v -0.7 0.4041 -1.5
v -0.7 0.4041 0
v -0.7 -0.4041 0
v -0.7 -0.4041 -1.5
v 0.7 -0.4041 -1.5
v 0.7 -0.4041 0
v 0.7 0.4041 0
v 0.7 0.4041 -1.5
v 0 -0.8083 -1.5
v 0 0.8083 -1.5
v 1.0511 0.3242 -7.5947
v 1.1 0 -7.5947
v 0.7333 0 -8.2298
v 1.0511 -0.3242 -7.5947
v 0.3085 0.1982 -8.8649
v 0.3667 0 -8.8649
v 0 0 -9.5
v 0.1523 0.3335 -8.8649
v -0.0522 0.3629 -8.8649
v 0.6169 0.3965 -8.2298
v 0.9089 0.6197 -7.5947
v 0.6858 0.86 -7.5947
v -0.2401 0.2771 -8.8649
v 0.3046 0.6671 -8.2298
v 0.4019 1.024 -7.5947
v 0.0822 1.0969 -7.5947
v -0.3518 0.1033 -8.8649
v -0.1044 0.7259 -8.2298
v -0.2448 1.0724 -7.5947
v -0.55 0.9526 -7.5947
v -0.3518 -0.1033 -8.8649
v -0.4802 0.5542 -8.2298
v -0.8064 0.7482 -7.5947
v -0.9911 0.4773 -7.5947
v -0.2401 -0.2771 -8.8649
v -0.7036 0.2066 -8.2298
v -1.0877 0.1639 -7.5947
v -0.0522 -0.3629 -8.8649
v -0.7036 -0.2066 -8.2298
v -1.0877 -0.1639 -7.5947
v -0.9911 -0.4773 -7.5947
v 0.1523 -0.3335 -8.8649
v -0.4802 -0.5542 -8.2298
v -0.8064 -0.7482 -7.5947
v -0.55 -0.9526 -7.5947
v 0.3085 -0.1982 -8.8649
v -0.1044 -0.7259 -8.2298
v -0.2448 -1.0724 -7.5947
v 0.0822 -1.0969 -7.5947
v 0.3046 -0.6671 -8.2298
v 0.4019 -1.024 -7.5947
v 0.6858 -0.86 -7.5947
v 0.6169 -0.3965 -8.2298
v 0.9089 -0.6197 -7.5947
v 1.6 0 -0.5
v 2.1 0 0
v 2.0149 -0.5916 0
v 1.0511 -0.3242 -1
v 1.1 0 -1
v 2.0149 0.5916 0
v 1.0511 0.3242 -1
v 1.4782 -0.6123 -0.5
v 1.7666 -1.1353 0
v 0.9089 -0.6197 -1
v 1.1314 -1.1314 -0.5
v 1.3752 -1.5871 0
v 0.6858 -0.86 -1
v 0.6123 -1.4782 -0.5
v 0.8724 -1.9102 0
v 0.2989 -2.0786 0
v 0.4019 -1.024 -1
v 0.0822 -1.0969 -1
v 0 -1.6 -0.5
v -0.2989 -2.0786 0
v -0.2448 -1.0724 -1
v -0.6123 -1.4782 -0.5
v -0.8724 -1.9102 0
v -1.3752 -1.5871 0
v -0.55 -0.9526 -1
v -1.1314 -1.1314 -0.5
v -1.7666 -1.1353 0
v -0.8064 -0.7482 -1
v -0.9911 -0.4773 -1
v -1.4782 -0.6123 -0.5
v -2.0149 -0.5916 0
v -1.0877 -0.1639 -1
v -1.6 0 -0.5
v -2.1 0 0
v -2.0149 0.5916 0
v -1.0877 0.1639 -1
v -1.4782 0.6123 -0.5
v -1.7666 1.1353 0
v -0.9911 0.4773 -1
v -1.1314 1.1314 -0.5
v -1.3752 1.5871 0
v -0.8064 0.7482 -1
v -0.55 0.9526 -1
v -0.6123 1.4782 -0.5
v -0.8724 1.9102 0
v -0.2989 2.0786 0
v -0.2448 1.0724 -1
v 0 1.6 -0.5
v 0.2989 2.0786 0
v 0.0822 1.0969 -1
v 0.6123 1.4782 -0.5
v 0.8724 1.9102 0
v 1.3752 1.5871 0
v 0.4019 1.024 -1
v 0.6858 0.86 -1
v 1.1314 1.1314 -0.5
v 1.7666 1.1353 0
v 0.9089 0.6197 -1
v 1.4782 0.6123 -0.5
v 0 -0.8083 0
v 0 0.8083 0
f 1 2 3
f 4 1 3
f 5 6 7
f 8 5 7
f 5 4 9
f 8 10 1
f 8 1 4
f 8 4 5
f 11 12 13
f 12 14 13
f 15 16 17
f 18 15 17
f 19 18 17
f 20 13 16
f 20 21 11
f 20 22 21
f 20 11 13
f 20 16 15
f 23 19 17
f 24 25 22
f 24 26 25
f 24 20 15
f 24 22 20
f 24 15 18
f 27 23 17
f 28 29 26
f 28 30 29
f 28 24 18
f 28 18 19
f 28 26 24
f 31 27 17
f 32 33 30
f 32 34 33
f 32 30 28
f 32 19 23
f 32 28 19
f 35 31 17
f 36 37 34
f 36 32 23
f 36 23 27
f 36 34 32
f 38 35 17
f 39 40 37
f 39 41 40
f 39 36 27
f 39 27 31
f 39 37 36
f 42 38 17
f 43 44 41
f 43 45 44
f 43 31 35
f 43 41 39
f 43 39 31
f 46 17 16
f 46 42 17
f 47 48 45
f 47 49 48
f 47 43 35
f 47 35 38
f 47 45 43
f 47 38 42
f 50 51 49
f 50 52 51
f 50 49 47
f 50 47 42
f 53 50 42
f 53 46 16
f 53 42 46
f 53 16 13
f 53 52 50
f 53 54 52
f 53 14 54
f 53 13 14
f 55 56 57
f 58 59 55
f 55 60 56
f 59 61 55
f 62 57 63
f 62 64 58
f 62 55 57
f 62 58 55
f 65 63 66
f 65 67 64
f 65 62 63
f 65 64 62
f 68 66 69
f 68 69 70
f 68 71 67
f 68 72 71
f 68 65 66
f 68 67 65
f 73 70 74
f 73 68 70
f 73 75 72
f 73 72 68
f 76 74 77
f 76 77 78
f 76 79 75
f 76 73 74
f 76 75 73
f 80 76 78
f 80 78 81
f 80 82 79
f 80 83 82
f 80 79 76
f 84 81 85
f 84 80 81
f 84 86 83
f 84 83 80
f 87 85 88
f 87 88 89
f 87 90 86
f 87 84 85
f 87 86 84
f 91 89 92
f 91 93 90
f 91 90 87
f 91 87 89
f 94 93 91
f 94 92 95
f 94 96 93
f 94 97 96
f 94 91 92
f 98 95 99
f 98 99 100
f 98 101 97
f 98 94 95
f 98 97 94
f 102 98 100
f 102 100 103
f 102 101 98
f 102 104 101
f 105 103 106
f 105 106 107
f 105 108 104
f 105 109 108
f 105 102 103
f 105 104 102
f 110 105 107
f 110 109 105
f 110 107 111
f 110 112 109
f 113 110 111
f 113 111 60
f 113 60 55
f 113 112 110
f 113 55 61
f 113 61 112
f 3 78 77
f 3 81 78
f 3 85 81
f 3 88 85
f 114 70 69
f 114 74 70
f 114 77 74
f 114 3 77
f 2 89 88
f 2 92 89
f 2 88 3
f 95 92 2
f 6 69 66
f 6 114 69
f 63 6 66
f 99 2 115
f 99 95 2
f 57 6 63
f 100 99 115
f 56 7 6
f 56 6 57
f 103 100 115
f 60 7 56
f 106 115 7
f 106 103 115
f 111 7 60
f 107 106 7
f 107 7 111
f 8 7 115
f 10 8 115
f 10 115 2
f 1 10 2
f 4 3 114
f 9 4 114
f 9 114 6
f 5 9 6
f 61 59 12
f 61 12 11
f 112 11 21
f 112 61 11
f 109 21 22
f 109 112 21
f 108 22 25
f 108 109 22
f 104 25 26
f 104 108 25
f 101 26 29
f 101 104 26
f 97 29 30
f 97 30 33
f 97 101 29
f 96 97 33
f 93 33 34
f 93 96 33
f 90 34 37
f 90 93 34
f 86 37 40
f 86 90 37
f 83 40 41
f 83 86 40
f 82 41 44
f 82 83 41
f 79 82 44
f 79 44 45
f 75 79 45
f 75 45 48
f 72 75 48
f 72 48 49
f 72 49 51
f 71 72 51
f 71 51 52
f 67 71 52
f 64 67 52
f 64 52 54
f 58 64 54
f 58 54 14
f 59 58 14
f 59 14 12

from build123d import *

# Parameters (mm, degrees)
ESQUISSE3_R             = 1.1
EXTRUSION1_DEPTH        = 9.5
ENL_V_MAT_EXTRU_2_DEPTH = 1.5
CHANFREIN1_SIZE         = 1.1
CHANFREIN1_SIZE2        = 1.905255888


with BuildPart() as part:
    # Esquisse1 → Révolution2 (revolve)
    with BuildSketch(Plane(origin=(0, 0, 0), x_dir=(0, 0, -1), z_dir=(1, 0, 0)), mode=Mode.PRIVATE) as r_volution2_sk:
        Polygon((0, 2.1), (1, 1.1), (1, 0), (0, 0), align=None)
    revolve(r_volution2_sk.sketch.rotate(Axis((0, 0, 1.603508429), (0, 0, -1)), 90), axis=Axis((0, 0, 1.603508429), (0, 0, -1)))

    # Esquisse3 → Extrusion1 (add)
    with BuildSketch(Plane.XY):
        Circle(ESQUISSE3_R)
    extrude(amount=-EXTRUSION1_DEPTH)

    # Esquisse2 → Enlèv. mat.-Extru.2 (cut)
    with BuildSketch(Plane.XY):
        Polygon((0, 0.808290377), (-0.7, 0.404145188), (-0.7, -0.404145188), (0, -0.808290377), (0.7, -0.404145188), (0.7, 0.404145188), align=None)
    extrude(amount=-ENL_V_MAT_EXTRU_2_DEPTH, mode=Mode.SUBTRACT)

    # Chanfrein1
    chanfrein1_edges = [part.edges().sort_by_distance(p)[0] for p in [
        (-1.1, 0, -9.5),
    ]]
    chanfrein1_side = [part.faces().sort_by_distance(p)[0] for p in [
        (0, 0, -9.5),
    ]]
    chamfer(chanfrein1_edges, length=CHANFREIN1_SIZE, length2=CHANFREIN1_SIZE2, reference=chanfrein1_side[0])


solid = part.part
